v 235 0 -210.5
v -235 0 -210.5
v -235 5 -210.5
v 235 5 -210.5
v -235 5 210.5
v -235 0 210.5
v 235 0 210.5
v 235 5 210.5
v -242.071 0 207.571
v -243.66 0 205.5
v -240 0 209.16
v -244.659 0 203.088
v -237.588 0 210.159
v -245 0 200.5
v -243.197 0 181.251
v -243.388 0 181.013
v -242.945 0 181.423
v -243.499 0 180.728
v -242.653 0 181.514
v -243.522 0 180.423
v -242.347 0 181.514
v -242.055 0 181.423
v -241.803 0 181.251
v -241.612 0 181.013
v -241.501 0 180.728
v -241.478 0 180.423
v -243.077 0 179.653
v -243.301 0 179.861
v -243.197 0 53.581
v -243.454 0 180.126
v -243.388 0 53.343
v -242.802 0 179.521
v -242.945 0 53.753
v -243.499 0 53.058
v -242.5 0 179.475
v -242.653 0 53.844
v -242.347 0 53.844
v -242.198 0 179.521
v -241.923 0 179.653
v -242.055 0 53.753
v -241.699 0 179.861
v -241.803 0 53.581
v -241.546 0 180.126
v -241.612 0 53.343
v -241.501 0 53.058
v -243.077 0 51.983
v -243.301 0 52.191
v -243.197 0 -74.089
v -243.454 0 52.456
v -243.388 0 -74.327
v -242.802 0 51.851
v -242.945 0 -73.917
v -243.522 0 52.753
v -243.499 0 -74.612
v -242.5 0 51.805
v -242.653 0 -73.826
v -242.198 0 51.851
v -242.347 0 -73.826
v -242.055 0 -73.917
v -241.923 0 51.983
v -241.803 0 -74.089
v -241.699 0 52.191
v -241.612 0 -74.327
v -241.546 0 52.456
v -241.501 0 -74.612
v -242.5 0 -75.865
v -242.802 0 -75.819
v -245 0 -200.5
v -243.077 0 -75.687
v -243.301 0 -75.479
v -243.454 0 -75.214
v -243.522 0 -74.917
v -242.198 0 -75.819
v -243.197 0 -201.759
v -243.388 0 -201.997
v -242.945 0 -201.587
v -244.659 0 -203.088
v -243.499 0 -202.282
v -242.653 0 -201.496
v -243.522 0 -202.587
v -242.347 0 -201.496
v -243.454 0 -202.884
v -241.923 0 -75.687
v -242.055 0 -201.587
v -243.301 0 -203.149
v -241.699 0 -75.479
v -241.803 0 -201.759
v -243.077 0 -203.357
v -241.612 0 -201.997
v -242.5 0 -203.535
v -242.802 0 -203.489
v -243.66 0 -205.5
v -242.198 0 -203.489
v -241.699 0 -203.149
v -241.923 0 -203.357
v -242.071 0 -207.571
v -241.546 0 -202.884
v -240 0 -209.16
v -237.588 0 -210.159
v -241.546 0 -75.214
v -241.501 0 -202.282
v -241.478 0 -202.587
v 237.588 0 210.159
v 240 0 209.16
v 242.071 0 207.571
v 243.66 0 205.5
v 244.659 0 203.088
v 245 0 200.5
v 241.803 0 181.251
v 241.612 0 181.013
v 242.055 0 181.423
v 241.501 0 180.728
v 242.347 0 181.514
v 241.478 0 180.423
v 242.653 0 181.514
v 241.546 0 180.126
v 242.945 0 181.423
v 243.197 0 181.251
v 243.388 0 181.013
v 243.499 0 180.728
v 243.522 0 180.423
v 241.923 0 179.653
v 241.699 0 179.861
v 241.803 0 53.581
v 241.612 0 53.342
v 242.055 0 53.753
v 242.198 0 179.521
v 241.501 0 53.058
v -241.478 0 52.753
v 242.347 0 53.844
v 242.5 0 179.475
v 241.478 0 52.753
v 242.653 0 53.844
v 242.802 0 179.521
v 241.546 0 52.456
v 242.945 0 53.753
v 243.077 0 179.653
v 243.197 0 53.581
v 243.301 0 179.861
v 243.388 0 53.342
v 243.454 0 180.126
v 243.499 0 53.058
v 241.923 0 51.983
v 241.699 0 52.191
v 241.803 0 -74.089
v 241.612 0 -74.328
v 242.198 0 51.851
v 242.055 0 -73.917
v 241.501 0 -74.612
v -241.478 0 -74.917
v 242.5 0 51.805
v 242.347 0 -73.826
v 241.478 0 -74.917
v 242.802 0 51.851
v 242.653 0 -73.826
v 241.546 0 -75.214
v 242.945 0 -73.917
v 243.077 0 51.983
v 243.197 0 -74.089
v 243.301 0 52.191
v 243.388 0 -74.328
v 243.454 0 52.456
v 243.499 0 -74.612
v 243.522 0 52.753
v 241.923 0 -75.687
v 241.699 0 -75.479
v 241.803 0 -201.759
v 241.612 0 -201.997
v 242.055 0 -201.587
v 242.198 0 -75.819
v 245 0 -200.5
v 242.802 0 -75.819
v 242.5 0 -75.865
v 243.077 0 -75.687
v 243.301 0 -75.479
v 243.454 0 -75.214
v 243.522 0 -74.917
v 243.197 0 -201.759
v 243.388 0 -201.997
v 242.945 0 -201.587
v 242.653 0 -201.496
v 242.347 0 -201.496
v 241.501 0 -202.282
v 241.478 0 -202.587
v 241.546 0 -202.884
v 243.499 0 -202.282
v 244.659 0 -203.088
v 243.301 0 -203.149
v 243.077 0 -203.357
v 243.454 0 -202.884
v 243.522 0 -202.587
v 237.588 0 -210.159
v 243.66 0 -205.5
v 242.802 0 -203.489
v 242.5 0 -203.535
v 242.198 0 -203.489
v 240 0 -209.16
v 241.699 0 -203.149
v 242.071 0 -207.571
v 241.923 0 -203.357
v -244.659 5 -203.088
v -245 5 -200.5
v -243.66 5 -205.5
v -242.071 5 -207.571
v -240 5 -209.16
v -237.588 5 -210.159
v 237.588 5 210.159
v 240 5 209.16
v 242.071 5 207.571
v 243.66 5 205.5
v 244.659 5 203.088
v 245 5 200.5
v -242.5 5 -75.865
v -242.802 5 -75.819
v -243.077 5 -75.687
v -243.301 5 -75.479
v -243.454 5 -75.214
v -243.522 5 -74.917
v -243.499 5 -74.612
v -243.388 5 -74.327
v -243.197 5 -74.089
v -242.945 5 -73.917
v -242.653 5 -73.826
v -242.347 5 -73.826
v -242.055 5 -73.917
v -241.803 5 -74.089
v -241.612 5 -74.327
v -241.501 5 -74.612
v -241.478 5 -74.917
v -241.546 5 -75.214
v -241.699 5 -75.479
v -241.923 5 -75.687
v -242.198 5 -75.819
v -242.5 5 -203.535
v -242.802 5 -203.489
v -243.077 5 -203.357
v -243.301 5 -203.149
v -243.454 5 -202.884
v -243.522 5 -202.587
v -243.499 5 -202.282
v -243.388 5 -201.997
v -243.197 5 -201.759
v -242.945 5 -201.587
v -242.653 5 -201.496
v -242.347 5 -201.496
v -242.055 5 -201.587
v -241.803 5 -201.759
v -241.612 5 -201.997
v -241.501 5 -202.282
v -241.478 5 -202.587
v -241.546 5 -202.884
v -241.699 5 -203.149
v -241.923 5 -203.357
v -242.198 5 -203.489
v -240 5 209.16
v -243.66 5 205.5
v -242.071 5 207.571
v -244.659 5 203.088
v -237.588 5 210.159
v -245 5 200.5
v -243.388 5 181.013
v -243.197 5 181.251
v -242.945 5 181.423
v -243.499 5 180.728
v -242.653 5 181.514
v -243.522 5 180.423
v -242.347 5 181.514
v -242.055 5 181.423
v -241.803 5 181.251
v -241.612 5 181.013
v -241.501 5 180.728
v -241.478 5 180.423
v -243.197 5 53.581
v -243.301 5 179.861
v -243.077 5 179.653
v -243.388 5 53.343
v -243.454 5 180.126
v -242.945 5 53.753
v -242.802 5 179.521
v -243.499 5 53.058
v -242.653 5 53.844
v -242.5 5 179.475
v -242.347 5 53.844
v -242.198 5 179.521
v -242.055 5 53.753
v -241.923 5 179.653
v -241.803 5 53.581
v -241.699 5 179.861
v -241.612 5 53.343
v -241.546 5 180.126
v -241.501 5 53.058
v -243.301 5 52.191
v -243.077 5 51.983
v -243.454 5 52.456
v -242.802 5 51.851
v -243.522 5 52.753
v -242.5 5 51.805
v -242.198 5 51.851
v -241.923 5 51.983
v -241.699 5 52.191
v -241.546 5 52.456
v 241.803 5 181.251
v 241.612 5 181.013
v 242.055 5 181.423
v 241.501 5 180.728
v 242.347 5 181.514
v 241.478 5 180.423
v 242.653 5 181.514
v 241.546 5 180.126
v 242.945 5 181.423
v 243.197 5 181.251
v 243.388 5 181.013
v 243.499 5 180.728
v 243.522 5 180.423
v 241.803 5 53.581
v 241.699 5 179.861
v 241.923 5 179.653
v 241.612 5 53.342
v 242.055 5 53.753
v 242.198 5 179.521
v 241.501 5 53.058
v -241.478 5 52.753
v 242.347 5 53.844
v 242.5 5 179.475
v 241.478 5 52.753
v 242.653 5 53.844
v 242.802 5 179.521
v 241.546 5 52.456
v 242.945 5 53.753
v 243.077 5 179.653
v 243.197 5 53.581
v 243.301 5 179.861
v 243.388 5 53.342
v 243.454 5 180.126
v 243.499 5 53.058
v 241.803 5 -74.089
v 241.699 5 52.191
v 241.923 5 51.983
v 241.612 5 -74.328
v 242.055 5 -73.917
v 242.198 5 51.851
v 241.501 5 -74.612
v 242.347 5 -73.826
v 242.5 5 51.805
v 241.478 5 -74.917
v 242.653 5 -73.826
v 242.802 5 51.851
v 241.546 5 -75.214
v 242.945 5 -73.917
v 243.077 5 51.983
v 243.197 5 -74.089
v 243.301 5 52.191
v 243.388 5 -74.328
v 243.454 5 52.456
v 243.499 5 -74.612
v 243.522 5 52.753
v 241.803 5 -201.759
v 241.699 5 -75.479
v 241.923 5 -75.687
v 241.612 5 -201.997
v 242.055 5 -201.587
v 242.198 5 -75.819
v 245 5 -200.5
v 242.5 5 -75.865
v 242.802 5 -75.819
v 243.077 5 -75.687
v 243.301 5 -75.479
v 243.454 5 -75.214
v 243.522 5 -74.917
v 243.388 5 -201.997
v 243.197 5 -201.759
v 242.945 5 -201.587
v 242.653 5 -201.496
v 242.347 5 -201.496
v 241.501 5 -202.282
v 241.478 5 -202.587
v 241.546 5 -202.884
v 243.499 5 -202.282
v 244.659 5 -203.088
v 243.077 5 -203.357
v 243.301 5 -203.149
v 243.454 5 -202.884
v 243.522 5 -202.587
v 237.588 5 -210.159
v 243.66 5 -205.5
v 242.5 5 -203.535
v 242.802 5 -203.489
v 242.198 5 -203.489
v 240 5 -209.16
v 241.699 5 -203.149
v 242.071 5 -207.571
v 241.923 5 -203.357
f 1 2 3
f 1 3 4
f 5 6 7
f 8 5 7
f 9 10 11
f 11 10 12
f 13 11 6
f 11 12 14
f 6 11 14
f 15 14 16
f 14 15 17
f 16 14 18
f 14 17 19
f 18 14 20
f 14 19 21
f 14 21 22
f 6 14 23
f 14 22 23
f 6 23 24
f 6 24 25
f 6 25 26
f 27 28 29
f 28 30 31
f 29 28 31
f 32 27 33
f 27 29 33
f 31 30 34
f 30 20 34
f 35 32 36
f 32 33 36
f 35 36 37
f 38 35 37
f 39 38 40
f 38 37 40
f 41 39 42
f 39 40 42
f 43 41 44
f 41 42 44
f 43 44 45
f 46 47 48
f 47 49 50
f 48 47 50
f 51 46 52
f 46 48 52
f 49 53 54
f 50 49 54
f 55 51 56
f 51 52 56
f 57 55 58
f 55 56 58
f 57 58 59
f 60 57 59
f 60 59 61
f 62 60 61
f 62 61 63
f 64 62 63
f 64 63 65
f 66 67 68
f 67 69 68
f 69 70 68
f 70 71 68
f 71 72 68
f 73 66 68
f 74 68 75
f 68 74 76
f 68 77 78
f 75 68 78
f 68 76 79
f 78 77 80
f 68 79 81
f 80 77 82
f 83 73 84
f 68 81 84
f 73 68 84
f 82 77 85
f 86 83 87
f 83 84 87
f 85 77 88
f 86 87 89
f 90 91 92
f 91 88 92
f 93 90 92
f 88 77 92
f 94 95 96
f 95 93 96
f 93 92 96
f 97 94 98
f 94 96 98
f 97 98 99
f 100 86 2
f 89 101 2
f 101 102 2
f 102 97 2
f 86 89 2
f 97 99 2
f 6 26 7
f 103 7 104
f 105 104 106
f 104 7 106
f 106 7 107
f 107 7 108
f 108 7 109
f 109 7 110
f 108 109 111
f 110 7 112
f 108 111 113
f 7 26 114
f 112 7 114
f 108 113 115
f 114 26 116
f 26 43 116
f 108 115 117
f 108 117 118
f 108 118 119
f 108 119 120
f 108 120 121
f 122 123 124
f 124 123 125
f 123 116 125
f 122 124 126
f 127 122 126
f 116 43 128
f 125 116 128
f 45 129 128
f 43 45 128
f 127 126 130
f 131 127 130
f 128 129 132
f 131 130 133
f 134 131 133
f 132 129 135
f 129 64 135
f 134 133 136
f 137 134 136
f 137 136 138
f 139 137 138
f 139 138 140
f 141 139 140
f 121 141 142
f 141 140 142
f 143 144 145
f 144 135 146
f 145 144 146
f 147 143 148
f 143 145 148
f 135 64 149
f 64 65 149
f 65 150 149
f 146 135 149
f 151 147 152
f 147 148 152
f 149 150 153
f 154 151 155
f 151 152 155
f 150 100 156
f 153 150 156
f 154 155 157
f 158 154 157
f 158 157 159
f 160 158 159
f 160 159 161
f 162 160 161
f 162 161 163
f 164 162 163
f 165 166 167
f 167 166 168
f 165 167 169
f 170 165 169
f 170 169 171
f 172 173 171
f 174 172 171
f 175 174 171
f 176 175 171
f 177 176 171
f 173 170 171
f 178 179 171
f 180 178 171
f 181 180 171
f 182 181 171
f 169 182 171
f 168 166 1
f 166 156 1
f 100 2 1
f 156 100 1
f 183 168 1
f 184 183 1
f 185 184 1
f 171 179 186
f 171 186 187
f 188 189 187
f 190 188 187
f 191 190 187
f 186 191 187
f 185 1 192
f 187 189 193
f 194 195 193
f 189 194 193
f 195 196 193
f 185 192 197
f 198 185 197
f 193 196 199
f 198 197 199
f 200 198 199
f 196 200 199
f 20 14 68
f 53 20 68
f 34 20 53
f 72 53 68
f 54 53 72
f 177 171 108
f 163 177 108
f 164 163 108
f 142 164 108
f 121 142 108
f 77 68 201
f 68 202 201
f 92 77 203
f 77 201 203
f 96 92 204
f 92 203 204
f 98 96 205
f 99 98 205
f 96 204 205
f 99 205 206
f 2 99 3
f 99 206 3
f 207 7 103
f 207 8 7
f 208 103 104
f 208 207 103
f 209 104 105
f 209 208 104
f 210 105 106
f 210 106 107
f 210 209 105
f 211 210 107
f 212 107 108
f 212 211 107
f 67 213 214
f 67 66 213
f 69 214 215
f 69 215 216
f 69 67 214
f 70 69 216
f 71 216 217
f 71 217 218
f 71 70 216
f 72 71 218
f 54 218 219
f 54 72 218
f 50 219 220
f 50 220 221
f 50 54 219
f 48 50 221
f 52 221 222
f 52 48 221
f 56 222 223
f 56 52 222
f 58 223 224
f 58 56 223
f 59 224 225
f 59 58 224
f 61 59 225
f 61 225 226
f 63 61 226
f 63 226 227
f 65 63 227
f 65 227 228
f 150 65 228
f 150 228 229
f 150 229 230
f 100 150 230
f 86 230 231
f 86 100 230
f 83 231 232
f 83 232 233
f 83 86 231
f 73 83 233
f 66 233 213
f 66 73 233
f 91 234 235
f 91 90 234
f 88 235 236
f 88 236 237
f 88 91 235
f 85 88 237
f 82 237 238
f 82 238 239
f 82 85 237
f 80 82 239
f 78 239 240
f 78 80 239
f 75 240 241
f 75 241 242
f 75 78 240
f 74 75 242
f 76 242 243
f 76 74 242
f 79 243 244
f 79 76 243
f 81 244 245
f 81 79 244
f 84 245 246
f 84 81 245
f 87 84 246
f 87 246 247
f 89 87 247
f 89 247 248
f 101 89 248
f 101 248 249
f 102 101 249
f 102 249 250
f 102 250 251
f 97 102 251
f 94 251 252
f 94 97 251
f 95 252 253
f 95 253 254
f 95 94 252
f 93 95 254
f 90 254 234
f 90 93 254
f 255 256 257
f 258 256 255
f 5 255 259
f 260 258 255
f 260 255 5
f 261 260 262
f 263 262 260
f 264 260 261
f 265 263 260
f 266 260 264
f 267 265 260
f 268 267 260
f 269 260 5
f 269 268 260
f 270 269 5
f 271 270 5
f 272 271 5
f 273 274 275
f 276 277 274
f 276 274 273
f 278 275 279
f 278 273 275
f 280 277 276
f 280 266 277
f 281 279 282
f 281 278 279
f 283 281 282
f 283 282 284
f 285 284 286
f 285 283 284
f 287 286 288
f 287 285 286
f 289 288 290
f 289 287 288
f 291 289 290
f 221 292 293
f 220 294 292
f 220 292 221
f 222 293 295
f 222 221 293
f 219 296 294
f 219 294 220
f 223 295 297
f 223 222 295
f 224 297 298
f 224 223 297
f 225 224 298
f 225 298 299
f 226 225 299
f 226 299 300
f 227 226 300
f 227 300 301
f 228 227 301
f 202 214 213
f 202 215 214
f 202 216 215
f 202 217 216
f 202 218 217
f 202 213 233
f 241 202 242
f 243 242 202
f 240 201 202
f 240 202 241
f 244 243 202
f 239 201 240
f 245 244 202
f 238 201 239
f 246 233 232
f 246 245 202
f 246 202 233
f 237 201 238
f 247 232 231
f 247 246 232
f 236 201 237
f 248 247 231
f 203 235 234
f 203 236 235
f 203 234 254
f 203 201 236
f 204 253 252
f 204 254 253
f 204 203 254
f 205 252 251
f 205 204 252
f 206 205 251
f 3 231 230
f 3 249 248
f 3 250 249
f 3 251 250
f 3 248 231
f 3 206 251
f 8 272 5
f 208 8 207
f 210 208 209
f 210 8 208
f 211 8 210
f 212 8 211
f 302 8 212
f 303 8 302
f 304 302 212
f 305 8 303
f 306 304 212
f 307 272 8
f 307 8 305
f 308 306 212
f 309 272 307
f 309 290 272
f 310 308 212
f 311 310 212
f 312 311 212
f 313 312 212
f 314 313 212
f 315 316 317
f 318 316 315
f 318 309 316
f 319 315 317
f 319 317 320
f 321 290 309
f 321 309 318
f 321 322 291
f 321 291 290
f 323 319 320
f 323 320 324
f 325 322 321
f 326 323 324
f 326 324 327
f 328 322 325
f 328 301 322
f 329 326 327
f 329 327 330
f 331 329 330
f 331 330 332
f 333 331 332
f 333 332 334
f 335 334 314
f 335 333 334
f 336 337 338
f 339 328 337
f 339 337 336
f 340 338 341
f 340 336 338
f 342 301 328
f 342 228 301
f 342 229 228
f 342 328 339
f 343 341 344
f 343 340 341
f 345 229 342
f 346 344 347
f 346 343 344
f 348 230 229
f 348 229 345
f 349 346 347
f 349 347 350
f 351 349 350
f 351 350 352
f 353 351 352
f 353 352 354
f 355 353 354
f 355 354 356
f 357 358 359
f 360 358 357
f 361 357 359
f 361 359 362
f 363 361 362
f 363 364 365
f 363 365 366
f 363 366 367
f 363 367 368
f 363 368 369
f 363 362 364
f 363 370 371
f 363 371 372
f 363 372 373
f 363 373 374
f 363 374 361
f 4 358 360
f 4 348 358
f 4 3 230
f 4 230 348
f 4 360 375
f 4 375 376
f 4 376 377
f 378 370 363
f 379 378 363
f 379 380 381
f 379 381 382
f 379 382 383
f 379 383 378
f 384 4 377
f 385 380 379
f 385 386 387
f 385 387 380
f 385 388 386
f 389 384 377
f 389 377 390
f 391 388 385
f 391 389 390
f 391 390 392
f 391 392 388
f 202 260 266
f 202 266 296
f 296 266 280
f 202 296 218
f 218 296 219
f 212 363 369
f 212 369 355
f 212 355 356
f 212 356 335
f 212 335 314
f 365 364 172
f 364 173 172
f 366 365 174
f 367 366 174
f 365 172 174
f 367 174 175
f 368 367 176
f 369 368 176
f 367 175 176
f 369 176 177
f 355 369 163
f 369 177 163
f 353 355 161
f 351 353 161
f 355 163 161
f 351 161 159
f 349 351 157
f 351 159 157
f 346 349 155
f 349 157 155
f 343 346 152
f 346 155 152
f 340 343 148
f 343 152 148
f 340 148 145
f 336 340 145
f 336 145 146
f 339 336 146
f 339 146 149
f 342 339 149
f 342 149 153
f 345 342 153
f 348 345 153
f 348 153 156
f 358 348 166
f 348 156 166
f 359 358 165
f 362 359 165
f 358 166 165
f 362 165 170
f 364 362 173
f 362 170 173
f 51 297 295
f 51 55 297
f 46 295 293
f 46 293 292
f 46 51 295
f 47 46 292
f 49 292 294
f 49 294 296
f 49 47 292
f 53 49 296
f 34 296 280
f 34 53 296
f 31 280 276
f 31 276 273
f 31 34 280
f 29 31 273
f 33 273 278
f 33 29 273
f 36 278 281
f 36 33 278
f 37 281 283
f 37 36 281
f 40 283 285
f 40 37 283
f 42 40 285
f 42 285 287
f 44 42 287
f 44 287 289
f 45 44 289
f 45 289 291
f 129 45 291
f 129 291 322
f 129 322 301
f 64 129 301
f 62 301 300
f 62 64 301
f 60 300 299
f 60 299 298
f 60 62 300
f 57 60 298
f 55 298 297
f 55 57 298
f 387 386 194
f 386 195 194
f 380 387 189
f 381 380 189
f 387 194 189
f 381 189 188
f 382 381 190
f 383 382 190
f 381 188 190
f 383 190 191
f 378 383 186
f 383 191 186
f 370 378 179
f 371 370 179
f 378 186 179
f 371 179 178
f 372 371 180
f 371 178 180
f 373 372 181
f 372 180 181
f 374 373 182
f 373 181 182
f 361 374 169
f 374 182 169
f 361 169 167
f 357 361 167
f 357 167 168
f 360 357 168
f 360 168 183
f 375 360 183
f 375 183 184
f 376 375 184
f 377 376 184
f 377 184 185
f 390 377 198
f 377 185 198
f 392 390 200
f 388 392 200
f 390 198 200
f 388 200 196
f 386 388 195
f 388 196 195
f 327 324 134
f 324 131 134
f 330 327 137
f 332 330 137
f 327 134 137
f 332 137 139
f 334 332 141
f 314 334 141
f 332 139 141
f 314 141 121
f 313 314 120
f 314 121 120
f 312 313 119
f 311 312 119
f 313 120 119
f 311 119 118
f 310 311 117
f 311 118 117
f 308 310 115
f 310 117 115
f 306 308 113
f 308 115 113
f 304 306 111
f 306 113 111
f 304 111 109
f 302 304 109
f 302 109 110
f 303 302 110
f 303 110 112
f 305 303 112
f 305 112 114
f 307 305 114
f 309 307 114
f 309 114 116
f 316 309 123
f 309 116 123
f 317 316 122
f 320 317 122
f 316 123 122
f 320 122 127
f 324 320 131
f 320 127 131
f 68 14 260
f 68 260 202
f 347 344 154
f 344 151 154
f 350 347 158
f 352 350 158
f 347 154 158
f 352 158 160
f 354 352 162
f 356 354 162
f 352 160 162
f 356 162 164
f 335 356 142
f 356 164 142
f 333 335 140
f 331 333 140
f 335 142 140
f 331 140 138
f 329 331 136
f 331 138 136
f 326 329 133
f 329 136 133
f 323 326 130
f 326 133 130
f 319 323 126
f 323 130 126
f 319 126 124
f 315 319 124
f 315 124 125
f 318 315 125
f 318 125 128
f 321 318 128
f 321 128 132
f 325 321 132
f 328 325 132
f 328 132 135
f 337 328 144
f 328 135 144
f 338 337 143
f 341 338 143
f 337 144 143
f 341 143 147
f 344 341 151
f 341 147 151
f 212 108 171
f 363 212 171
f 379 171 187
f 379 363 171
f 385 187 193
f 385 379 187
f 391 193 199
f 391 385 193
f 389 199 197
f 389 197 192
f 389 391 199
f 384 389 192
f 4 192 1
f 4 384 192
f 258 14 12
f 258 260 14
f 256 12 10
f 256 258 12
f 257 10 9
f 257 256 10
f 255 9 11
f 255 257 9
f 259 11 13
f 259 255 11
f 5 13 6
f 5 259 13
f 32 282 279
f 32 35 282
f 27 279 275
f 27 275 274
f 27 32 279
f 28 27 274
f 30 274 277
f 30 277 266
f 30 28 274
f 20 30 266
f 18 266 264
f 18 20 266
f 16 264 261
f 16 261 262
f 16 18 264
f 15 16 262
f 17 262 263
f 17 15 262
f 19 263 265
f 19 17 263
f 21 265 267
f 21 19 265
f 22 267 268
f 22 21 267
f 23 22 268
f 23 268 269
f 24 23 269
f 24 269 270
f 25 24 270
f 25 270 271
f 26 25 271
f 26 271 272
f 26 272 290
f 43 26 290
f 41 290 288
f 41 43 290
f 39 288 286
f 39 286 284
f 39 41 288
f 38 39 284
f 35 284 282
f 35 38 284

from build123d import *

# Parameters (mm, degrees)
SKETCH1_W           = 490
SKETCH1_H           = 421
BOSS_EXTRUDE1_DEPTH = 5
FILLET1_R           = 10
LPATTERN2_COUNT     = 4
LPATTERN2_PITCH     = 127.67


with BuildPart() as part:
    # Sketch1 → Boss-Extrude1 (new body)
    with BuildSketch(Plane(origin=(0, 0, 0), x_dir=(1, 0, 0), z_dir=(0, 1, 0))):
        Rectangle(SKETCH1_W, SKETCH1_H)
    extrude(amount=BOSS_EXTRUDE1_DEPTH)

    # Fillet1
    fillet1_edges = [part.edges().sort_by_distance(p)[0] for p in [
        (-245, 2.5, -210.5),
        (245, 2.5, -210.5),
        (245, 2.5, 210.5),
        (-245, 2.5, 210.5),
    ]]
    fillet(fillet1_edges, radius=FILLET1_R)

    # Sketch4 → Tap Drill for M2.5x0.45 Tap1 (revolve, cut)
    with BuildSketch(Plane(origin=(-242.5, 0, 180.5), x_dir=(0, 0, -1), z_dir=(1, 0, 0))):
        Polygon((0, 0), (0, 5.615882135), (1.025, 5), (1.025, 0), align=None)
    tap_drill_for_m2_5x0_45_tap1 = revolve(axis=Axis((-242.5, -6.35, 180.5), (0, 1, 0)), mode=Mode.SUBTRACT)

    # LPattern2: Tap Drill for M2.5x0.45 Tap1 ×4
    with Locations(*[(0, 0, -i * LPATTERN2_PITCH) for i in range(1, LPATTERN2_COUNT)]):
        add(tap_drill_for_m2_5x0_45_tap1, mode=Mode.SUBTRACT)

    # Mirror2: Tap Drill for M2.5x0.45 Tap1 across plane
    add(tap_drill_for_m2_5x0_45_tap1.mirror(Plane(origin=(0, 0, 0), x_dir=(0, 0, 1), z_dir=(1, 0, 0))), mode=Mode.SUBTRACT)

    # Mirror2 copy 1 sketch → Mirror2 copy 1 (revolve, cut)
    with BuildSketch(Plane(origin=(242.5, 0, 52.83), x_dir=(0, 0, -1), z_dir=(-1, 0, 0))):
        Polygon((0, 0), (0, -5.615882135), (1.025, -5), (1.025, 0), align=None)
    revolve(axis=Axis((242.5, -6.35, 52.83), (0, -1, 0)), mode=Mode.SUBTRACT)

    # Mirror2 copy 2 sketch → Mirror2 copy 2 (revolve, cut)
    with BuildSketch(Plane(origin=(242.5, 0, -74.84), x_dir=(0, 0, -1), z_dir=(-1, 0, 0))):
        Polygon((0, 0), (0, -5.615882135), (1.025, -5), (1.025, 0), align=None)
    revolve(axis=Axis((242.5, -6.35, -74.84), (0, -1, 0)), mode=Mode.SUBTRACT)

    # Mirror2 copy 3 sketch → Mirror2 copy 3 (revolve, cut)
    with BuildSketch(Plane(origin=(242.5, 0, -202.51), x_dir=(0, 0, -1), z_dir=(-1, 0, 0))):
        Polygon((0, 0), (0, -5.615882135), (1.025, -5), (1.025, 0), align=None)
    revolve(axis=Axis((242.5, -6.35, -202.51), (0, -1, 0)), mode=Mode.SUBTRACT)


solid = part.part
